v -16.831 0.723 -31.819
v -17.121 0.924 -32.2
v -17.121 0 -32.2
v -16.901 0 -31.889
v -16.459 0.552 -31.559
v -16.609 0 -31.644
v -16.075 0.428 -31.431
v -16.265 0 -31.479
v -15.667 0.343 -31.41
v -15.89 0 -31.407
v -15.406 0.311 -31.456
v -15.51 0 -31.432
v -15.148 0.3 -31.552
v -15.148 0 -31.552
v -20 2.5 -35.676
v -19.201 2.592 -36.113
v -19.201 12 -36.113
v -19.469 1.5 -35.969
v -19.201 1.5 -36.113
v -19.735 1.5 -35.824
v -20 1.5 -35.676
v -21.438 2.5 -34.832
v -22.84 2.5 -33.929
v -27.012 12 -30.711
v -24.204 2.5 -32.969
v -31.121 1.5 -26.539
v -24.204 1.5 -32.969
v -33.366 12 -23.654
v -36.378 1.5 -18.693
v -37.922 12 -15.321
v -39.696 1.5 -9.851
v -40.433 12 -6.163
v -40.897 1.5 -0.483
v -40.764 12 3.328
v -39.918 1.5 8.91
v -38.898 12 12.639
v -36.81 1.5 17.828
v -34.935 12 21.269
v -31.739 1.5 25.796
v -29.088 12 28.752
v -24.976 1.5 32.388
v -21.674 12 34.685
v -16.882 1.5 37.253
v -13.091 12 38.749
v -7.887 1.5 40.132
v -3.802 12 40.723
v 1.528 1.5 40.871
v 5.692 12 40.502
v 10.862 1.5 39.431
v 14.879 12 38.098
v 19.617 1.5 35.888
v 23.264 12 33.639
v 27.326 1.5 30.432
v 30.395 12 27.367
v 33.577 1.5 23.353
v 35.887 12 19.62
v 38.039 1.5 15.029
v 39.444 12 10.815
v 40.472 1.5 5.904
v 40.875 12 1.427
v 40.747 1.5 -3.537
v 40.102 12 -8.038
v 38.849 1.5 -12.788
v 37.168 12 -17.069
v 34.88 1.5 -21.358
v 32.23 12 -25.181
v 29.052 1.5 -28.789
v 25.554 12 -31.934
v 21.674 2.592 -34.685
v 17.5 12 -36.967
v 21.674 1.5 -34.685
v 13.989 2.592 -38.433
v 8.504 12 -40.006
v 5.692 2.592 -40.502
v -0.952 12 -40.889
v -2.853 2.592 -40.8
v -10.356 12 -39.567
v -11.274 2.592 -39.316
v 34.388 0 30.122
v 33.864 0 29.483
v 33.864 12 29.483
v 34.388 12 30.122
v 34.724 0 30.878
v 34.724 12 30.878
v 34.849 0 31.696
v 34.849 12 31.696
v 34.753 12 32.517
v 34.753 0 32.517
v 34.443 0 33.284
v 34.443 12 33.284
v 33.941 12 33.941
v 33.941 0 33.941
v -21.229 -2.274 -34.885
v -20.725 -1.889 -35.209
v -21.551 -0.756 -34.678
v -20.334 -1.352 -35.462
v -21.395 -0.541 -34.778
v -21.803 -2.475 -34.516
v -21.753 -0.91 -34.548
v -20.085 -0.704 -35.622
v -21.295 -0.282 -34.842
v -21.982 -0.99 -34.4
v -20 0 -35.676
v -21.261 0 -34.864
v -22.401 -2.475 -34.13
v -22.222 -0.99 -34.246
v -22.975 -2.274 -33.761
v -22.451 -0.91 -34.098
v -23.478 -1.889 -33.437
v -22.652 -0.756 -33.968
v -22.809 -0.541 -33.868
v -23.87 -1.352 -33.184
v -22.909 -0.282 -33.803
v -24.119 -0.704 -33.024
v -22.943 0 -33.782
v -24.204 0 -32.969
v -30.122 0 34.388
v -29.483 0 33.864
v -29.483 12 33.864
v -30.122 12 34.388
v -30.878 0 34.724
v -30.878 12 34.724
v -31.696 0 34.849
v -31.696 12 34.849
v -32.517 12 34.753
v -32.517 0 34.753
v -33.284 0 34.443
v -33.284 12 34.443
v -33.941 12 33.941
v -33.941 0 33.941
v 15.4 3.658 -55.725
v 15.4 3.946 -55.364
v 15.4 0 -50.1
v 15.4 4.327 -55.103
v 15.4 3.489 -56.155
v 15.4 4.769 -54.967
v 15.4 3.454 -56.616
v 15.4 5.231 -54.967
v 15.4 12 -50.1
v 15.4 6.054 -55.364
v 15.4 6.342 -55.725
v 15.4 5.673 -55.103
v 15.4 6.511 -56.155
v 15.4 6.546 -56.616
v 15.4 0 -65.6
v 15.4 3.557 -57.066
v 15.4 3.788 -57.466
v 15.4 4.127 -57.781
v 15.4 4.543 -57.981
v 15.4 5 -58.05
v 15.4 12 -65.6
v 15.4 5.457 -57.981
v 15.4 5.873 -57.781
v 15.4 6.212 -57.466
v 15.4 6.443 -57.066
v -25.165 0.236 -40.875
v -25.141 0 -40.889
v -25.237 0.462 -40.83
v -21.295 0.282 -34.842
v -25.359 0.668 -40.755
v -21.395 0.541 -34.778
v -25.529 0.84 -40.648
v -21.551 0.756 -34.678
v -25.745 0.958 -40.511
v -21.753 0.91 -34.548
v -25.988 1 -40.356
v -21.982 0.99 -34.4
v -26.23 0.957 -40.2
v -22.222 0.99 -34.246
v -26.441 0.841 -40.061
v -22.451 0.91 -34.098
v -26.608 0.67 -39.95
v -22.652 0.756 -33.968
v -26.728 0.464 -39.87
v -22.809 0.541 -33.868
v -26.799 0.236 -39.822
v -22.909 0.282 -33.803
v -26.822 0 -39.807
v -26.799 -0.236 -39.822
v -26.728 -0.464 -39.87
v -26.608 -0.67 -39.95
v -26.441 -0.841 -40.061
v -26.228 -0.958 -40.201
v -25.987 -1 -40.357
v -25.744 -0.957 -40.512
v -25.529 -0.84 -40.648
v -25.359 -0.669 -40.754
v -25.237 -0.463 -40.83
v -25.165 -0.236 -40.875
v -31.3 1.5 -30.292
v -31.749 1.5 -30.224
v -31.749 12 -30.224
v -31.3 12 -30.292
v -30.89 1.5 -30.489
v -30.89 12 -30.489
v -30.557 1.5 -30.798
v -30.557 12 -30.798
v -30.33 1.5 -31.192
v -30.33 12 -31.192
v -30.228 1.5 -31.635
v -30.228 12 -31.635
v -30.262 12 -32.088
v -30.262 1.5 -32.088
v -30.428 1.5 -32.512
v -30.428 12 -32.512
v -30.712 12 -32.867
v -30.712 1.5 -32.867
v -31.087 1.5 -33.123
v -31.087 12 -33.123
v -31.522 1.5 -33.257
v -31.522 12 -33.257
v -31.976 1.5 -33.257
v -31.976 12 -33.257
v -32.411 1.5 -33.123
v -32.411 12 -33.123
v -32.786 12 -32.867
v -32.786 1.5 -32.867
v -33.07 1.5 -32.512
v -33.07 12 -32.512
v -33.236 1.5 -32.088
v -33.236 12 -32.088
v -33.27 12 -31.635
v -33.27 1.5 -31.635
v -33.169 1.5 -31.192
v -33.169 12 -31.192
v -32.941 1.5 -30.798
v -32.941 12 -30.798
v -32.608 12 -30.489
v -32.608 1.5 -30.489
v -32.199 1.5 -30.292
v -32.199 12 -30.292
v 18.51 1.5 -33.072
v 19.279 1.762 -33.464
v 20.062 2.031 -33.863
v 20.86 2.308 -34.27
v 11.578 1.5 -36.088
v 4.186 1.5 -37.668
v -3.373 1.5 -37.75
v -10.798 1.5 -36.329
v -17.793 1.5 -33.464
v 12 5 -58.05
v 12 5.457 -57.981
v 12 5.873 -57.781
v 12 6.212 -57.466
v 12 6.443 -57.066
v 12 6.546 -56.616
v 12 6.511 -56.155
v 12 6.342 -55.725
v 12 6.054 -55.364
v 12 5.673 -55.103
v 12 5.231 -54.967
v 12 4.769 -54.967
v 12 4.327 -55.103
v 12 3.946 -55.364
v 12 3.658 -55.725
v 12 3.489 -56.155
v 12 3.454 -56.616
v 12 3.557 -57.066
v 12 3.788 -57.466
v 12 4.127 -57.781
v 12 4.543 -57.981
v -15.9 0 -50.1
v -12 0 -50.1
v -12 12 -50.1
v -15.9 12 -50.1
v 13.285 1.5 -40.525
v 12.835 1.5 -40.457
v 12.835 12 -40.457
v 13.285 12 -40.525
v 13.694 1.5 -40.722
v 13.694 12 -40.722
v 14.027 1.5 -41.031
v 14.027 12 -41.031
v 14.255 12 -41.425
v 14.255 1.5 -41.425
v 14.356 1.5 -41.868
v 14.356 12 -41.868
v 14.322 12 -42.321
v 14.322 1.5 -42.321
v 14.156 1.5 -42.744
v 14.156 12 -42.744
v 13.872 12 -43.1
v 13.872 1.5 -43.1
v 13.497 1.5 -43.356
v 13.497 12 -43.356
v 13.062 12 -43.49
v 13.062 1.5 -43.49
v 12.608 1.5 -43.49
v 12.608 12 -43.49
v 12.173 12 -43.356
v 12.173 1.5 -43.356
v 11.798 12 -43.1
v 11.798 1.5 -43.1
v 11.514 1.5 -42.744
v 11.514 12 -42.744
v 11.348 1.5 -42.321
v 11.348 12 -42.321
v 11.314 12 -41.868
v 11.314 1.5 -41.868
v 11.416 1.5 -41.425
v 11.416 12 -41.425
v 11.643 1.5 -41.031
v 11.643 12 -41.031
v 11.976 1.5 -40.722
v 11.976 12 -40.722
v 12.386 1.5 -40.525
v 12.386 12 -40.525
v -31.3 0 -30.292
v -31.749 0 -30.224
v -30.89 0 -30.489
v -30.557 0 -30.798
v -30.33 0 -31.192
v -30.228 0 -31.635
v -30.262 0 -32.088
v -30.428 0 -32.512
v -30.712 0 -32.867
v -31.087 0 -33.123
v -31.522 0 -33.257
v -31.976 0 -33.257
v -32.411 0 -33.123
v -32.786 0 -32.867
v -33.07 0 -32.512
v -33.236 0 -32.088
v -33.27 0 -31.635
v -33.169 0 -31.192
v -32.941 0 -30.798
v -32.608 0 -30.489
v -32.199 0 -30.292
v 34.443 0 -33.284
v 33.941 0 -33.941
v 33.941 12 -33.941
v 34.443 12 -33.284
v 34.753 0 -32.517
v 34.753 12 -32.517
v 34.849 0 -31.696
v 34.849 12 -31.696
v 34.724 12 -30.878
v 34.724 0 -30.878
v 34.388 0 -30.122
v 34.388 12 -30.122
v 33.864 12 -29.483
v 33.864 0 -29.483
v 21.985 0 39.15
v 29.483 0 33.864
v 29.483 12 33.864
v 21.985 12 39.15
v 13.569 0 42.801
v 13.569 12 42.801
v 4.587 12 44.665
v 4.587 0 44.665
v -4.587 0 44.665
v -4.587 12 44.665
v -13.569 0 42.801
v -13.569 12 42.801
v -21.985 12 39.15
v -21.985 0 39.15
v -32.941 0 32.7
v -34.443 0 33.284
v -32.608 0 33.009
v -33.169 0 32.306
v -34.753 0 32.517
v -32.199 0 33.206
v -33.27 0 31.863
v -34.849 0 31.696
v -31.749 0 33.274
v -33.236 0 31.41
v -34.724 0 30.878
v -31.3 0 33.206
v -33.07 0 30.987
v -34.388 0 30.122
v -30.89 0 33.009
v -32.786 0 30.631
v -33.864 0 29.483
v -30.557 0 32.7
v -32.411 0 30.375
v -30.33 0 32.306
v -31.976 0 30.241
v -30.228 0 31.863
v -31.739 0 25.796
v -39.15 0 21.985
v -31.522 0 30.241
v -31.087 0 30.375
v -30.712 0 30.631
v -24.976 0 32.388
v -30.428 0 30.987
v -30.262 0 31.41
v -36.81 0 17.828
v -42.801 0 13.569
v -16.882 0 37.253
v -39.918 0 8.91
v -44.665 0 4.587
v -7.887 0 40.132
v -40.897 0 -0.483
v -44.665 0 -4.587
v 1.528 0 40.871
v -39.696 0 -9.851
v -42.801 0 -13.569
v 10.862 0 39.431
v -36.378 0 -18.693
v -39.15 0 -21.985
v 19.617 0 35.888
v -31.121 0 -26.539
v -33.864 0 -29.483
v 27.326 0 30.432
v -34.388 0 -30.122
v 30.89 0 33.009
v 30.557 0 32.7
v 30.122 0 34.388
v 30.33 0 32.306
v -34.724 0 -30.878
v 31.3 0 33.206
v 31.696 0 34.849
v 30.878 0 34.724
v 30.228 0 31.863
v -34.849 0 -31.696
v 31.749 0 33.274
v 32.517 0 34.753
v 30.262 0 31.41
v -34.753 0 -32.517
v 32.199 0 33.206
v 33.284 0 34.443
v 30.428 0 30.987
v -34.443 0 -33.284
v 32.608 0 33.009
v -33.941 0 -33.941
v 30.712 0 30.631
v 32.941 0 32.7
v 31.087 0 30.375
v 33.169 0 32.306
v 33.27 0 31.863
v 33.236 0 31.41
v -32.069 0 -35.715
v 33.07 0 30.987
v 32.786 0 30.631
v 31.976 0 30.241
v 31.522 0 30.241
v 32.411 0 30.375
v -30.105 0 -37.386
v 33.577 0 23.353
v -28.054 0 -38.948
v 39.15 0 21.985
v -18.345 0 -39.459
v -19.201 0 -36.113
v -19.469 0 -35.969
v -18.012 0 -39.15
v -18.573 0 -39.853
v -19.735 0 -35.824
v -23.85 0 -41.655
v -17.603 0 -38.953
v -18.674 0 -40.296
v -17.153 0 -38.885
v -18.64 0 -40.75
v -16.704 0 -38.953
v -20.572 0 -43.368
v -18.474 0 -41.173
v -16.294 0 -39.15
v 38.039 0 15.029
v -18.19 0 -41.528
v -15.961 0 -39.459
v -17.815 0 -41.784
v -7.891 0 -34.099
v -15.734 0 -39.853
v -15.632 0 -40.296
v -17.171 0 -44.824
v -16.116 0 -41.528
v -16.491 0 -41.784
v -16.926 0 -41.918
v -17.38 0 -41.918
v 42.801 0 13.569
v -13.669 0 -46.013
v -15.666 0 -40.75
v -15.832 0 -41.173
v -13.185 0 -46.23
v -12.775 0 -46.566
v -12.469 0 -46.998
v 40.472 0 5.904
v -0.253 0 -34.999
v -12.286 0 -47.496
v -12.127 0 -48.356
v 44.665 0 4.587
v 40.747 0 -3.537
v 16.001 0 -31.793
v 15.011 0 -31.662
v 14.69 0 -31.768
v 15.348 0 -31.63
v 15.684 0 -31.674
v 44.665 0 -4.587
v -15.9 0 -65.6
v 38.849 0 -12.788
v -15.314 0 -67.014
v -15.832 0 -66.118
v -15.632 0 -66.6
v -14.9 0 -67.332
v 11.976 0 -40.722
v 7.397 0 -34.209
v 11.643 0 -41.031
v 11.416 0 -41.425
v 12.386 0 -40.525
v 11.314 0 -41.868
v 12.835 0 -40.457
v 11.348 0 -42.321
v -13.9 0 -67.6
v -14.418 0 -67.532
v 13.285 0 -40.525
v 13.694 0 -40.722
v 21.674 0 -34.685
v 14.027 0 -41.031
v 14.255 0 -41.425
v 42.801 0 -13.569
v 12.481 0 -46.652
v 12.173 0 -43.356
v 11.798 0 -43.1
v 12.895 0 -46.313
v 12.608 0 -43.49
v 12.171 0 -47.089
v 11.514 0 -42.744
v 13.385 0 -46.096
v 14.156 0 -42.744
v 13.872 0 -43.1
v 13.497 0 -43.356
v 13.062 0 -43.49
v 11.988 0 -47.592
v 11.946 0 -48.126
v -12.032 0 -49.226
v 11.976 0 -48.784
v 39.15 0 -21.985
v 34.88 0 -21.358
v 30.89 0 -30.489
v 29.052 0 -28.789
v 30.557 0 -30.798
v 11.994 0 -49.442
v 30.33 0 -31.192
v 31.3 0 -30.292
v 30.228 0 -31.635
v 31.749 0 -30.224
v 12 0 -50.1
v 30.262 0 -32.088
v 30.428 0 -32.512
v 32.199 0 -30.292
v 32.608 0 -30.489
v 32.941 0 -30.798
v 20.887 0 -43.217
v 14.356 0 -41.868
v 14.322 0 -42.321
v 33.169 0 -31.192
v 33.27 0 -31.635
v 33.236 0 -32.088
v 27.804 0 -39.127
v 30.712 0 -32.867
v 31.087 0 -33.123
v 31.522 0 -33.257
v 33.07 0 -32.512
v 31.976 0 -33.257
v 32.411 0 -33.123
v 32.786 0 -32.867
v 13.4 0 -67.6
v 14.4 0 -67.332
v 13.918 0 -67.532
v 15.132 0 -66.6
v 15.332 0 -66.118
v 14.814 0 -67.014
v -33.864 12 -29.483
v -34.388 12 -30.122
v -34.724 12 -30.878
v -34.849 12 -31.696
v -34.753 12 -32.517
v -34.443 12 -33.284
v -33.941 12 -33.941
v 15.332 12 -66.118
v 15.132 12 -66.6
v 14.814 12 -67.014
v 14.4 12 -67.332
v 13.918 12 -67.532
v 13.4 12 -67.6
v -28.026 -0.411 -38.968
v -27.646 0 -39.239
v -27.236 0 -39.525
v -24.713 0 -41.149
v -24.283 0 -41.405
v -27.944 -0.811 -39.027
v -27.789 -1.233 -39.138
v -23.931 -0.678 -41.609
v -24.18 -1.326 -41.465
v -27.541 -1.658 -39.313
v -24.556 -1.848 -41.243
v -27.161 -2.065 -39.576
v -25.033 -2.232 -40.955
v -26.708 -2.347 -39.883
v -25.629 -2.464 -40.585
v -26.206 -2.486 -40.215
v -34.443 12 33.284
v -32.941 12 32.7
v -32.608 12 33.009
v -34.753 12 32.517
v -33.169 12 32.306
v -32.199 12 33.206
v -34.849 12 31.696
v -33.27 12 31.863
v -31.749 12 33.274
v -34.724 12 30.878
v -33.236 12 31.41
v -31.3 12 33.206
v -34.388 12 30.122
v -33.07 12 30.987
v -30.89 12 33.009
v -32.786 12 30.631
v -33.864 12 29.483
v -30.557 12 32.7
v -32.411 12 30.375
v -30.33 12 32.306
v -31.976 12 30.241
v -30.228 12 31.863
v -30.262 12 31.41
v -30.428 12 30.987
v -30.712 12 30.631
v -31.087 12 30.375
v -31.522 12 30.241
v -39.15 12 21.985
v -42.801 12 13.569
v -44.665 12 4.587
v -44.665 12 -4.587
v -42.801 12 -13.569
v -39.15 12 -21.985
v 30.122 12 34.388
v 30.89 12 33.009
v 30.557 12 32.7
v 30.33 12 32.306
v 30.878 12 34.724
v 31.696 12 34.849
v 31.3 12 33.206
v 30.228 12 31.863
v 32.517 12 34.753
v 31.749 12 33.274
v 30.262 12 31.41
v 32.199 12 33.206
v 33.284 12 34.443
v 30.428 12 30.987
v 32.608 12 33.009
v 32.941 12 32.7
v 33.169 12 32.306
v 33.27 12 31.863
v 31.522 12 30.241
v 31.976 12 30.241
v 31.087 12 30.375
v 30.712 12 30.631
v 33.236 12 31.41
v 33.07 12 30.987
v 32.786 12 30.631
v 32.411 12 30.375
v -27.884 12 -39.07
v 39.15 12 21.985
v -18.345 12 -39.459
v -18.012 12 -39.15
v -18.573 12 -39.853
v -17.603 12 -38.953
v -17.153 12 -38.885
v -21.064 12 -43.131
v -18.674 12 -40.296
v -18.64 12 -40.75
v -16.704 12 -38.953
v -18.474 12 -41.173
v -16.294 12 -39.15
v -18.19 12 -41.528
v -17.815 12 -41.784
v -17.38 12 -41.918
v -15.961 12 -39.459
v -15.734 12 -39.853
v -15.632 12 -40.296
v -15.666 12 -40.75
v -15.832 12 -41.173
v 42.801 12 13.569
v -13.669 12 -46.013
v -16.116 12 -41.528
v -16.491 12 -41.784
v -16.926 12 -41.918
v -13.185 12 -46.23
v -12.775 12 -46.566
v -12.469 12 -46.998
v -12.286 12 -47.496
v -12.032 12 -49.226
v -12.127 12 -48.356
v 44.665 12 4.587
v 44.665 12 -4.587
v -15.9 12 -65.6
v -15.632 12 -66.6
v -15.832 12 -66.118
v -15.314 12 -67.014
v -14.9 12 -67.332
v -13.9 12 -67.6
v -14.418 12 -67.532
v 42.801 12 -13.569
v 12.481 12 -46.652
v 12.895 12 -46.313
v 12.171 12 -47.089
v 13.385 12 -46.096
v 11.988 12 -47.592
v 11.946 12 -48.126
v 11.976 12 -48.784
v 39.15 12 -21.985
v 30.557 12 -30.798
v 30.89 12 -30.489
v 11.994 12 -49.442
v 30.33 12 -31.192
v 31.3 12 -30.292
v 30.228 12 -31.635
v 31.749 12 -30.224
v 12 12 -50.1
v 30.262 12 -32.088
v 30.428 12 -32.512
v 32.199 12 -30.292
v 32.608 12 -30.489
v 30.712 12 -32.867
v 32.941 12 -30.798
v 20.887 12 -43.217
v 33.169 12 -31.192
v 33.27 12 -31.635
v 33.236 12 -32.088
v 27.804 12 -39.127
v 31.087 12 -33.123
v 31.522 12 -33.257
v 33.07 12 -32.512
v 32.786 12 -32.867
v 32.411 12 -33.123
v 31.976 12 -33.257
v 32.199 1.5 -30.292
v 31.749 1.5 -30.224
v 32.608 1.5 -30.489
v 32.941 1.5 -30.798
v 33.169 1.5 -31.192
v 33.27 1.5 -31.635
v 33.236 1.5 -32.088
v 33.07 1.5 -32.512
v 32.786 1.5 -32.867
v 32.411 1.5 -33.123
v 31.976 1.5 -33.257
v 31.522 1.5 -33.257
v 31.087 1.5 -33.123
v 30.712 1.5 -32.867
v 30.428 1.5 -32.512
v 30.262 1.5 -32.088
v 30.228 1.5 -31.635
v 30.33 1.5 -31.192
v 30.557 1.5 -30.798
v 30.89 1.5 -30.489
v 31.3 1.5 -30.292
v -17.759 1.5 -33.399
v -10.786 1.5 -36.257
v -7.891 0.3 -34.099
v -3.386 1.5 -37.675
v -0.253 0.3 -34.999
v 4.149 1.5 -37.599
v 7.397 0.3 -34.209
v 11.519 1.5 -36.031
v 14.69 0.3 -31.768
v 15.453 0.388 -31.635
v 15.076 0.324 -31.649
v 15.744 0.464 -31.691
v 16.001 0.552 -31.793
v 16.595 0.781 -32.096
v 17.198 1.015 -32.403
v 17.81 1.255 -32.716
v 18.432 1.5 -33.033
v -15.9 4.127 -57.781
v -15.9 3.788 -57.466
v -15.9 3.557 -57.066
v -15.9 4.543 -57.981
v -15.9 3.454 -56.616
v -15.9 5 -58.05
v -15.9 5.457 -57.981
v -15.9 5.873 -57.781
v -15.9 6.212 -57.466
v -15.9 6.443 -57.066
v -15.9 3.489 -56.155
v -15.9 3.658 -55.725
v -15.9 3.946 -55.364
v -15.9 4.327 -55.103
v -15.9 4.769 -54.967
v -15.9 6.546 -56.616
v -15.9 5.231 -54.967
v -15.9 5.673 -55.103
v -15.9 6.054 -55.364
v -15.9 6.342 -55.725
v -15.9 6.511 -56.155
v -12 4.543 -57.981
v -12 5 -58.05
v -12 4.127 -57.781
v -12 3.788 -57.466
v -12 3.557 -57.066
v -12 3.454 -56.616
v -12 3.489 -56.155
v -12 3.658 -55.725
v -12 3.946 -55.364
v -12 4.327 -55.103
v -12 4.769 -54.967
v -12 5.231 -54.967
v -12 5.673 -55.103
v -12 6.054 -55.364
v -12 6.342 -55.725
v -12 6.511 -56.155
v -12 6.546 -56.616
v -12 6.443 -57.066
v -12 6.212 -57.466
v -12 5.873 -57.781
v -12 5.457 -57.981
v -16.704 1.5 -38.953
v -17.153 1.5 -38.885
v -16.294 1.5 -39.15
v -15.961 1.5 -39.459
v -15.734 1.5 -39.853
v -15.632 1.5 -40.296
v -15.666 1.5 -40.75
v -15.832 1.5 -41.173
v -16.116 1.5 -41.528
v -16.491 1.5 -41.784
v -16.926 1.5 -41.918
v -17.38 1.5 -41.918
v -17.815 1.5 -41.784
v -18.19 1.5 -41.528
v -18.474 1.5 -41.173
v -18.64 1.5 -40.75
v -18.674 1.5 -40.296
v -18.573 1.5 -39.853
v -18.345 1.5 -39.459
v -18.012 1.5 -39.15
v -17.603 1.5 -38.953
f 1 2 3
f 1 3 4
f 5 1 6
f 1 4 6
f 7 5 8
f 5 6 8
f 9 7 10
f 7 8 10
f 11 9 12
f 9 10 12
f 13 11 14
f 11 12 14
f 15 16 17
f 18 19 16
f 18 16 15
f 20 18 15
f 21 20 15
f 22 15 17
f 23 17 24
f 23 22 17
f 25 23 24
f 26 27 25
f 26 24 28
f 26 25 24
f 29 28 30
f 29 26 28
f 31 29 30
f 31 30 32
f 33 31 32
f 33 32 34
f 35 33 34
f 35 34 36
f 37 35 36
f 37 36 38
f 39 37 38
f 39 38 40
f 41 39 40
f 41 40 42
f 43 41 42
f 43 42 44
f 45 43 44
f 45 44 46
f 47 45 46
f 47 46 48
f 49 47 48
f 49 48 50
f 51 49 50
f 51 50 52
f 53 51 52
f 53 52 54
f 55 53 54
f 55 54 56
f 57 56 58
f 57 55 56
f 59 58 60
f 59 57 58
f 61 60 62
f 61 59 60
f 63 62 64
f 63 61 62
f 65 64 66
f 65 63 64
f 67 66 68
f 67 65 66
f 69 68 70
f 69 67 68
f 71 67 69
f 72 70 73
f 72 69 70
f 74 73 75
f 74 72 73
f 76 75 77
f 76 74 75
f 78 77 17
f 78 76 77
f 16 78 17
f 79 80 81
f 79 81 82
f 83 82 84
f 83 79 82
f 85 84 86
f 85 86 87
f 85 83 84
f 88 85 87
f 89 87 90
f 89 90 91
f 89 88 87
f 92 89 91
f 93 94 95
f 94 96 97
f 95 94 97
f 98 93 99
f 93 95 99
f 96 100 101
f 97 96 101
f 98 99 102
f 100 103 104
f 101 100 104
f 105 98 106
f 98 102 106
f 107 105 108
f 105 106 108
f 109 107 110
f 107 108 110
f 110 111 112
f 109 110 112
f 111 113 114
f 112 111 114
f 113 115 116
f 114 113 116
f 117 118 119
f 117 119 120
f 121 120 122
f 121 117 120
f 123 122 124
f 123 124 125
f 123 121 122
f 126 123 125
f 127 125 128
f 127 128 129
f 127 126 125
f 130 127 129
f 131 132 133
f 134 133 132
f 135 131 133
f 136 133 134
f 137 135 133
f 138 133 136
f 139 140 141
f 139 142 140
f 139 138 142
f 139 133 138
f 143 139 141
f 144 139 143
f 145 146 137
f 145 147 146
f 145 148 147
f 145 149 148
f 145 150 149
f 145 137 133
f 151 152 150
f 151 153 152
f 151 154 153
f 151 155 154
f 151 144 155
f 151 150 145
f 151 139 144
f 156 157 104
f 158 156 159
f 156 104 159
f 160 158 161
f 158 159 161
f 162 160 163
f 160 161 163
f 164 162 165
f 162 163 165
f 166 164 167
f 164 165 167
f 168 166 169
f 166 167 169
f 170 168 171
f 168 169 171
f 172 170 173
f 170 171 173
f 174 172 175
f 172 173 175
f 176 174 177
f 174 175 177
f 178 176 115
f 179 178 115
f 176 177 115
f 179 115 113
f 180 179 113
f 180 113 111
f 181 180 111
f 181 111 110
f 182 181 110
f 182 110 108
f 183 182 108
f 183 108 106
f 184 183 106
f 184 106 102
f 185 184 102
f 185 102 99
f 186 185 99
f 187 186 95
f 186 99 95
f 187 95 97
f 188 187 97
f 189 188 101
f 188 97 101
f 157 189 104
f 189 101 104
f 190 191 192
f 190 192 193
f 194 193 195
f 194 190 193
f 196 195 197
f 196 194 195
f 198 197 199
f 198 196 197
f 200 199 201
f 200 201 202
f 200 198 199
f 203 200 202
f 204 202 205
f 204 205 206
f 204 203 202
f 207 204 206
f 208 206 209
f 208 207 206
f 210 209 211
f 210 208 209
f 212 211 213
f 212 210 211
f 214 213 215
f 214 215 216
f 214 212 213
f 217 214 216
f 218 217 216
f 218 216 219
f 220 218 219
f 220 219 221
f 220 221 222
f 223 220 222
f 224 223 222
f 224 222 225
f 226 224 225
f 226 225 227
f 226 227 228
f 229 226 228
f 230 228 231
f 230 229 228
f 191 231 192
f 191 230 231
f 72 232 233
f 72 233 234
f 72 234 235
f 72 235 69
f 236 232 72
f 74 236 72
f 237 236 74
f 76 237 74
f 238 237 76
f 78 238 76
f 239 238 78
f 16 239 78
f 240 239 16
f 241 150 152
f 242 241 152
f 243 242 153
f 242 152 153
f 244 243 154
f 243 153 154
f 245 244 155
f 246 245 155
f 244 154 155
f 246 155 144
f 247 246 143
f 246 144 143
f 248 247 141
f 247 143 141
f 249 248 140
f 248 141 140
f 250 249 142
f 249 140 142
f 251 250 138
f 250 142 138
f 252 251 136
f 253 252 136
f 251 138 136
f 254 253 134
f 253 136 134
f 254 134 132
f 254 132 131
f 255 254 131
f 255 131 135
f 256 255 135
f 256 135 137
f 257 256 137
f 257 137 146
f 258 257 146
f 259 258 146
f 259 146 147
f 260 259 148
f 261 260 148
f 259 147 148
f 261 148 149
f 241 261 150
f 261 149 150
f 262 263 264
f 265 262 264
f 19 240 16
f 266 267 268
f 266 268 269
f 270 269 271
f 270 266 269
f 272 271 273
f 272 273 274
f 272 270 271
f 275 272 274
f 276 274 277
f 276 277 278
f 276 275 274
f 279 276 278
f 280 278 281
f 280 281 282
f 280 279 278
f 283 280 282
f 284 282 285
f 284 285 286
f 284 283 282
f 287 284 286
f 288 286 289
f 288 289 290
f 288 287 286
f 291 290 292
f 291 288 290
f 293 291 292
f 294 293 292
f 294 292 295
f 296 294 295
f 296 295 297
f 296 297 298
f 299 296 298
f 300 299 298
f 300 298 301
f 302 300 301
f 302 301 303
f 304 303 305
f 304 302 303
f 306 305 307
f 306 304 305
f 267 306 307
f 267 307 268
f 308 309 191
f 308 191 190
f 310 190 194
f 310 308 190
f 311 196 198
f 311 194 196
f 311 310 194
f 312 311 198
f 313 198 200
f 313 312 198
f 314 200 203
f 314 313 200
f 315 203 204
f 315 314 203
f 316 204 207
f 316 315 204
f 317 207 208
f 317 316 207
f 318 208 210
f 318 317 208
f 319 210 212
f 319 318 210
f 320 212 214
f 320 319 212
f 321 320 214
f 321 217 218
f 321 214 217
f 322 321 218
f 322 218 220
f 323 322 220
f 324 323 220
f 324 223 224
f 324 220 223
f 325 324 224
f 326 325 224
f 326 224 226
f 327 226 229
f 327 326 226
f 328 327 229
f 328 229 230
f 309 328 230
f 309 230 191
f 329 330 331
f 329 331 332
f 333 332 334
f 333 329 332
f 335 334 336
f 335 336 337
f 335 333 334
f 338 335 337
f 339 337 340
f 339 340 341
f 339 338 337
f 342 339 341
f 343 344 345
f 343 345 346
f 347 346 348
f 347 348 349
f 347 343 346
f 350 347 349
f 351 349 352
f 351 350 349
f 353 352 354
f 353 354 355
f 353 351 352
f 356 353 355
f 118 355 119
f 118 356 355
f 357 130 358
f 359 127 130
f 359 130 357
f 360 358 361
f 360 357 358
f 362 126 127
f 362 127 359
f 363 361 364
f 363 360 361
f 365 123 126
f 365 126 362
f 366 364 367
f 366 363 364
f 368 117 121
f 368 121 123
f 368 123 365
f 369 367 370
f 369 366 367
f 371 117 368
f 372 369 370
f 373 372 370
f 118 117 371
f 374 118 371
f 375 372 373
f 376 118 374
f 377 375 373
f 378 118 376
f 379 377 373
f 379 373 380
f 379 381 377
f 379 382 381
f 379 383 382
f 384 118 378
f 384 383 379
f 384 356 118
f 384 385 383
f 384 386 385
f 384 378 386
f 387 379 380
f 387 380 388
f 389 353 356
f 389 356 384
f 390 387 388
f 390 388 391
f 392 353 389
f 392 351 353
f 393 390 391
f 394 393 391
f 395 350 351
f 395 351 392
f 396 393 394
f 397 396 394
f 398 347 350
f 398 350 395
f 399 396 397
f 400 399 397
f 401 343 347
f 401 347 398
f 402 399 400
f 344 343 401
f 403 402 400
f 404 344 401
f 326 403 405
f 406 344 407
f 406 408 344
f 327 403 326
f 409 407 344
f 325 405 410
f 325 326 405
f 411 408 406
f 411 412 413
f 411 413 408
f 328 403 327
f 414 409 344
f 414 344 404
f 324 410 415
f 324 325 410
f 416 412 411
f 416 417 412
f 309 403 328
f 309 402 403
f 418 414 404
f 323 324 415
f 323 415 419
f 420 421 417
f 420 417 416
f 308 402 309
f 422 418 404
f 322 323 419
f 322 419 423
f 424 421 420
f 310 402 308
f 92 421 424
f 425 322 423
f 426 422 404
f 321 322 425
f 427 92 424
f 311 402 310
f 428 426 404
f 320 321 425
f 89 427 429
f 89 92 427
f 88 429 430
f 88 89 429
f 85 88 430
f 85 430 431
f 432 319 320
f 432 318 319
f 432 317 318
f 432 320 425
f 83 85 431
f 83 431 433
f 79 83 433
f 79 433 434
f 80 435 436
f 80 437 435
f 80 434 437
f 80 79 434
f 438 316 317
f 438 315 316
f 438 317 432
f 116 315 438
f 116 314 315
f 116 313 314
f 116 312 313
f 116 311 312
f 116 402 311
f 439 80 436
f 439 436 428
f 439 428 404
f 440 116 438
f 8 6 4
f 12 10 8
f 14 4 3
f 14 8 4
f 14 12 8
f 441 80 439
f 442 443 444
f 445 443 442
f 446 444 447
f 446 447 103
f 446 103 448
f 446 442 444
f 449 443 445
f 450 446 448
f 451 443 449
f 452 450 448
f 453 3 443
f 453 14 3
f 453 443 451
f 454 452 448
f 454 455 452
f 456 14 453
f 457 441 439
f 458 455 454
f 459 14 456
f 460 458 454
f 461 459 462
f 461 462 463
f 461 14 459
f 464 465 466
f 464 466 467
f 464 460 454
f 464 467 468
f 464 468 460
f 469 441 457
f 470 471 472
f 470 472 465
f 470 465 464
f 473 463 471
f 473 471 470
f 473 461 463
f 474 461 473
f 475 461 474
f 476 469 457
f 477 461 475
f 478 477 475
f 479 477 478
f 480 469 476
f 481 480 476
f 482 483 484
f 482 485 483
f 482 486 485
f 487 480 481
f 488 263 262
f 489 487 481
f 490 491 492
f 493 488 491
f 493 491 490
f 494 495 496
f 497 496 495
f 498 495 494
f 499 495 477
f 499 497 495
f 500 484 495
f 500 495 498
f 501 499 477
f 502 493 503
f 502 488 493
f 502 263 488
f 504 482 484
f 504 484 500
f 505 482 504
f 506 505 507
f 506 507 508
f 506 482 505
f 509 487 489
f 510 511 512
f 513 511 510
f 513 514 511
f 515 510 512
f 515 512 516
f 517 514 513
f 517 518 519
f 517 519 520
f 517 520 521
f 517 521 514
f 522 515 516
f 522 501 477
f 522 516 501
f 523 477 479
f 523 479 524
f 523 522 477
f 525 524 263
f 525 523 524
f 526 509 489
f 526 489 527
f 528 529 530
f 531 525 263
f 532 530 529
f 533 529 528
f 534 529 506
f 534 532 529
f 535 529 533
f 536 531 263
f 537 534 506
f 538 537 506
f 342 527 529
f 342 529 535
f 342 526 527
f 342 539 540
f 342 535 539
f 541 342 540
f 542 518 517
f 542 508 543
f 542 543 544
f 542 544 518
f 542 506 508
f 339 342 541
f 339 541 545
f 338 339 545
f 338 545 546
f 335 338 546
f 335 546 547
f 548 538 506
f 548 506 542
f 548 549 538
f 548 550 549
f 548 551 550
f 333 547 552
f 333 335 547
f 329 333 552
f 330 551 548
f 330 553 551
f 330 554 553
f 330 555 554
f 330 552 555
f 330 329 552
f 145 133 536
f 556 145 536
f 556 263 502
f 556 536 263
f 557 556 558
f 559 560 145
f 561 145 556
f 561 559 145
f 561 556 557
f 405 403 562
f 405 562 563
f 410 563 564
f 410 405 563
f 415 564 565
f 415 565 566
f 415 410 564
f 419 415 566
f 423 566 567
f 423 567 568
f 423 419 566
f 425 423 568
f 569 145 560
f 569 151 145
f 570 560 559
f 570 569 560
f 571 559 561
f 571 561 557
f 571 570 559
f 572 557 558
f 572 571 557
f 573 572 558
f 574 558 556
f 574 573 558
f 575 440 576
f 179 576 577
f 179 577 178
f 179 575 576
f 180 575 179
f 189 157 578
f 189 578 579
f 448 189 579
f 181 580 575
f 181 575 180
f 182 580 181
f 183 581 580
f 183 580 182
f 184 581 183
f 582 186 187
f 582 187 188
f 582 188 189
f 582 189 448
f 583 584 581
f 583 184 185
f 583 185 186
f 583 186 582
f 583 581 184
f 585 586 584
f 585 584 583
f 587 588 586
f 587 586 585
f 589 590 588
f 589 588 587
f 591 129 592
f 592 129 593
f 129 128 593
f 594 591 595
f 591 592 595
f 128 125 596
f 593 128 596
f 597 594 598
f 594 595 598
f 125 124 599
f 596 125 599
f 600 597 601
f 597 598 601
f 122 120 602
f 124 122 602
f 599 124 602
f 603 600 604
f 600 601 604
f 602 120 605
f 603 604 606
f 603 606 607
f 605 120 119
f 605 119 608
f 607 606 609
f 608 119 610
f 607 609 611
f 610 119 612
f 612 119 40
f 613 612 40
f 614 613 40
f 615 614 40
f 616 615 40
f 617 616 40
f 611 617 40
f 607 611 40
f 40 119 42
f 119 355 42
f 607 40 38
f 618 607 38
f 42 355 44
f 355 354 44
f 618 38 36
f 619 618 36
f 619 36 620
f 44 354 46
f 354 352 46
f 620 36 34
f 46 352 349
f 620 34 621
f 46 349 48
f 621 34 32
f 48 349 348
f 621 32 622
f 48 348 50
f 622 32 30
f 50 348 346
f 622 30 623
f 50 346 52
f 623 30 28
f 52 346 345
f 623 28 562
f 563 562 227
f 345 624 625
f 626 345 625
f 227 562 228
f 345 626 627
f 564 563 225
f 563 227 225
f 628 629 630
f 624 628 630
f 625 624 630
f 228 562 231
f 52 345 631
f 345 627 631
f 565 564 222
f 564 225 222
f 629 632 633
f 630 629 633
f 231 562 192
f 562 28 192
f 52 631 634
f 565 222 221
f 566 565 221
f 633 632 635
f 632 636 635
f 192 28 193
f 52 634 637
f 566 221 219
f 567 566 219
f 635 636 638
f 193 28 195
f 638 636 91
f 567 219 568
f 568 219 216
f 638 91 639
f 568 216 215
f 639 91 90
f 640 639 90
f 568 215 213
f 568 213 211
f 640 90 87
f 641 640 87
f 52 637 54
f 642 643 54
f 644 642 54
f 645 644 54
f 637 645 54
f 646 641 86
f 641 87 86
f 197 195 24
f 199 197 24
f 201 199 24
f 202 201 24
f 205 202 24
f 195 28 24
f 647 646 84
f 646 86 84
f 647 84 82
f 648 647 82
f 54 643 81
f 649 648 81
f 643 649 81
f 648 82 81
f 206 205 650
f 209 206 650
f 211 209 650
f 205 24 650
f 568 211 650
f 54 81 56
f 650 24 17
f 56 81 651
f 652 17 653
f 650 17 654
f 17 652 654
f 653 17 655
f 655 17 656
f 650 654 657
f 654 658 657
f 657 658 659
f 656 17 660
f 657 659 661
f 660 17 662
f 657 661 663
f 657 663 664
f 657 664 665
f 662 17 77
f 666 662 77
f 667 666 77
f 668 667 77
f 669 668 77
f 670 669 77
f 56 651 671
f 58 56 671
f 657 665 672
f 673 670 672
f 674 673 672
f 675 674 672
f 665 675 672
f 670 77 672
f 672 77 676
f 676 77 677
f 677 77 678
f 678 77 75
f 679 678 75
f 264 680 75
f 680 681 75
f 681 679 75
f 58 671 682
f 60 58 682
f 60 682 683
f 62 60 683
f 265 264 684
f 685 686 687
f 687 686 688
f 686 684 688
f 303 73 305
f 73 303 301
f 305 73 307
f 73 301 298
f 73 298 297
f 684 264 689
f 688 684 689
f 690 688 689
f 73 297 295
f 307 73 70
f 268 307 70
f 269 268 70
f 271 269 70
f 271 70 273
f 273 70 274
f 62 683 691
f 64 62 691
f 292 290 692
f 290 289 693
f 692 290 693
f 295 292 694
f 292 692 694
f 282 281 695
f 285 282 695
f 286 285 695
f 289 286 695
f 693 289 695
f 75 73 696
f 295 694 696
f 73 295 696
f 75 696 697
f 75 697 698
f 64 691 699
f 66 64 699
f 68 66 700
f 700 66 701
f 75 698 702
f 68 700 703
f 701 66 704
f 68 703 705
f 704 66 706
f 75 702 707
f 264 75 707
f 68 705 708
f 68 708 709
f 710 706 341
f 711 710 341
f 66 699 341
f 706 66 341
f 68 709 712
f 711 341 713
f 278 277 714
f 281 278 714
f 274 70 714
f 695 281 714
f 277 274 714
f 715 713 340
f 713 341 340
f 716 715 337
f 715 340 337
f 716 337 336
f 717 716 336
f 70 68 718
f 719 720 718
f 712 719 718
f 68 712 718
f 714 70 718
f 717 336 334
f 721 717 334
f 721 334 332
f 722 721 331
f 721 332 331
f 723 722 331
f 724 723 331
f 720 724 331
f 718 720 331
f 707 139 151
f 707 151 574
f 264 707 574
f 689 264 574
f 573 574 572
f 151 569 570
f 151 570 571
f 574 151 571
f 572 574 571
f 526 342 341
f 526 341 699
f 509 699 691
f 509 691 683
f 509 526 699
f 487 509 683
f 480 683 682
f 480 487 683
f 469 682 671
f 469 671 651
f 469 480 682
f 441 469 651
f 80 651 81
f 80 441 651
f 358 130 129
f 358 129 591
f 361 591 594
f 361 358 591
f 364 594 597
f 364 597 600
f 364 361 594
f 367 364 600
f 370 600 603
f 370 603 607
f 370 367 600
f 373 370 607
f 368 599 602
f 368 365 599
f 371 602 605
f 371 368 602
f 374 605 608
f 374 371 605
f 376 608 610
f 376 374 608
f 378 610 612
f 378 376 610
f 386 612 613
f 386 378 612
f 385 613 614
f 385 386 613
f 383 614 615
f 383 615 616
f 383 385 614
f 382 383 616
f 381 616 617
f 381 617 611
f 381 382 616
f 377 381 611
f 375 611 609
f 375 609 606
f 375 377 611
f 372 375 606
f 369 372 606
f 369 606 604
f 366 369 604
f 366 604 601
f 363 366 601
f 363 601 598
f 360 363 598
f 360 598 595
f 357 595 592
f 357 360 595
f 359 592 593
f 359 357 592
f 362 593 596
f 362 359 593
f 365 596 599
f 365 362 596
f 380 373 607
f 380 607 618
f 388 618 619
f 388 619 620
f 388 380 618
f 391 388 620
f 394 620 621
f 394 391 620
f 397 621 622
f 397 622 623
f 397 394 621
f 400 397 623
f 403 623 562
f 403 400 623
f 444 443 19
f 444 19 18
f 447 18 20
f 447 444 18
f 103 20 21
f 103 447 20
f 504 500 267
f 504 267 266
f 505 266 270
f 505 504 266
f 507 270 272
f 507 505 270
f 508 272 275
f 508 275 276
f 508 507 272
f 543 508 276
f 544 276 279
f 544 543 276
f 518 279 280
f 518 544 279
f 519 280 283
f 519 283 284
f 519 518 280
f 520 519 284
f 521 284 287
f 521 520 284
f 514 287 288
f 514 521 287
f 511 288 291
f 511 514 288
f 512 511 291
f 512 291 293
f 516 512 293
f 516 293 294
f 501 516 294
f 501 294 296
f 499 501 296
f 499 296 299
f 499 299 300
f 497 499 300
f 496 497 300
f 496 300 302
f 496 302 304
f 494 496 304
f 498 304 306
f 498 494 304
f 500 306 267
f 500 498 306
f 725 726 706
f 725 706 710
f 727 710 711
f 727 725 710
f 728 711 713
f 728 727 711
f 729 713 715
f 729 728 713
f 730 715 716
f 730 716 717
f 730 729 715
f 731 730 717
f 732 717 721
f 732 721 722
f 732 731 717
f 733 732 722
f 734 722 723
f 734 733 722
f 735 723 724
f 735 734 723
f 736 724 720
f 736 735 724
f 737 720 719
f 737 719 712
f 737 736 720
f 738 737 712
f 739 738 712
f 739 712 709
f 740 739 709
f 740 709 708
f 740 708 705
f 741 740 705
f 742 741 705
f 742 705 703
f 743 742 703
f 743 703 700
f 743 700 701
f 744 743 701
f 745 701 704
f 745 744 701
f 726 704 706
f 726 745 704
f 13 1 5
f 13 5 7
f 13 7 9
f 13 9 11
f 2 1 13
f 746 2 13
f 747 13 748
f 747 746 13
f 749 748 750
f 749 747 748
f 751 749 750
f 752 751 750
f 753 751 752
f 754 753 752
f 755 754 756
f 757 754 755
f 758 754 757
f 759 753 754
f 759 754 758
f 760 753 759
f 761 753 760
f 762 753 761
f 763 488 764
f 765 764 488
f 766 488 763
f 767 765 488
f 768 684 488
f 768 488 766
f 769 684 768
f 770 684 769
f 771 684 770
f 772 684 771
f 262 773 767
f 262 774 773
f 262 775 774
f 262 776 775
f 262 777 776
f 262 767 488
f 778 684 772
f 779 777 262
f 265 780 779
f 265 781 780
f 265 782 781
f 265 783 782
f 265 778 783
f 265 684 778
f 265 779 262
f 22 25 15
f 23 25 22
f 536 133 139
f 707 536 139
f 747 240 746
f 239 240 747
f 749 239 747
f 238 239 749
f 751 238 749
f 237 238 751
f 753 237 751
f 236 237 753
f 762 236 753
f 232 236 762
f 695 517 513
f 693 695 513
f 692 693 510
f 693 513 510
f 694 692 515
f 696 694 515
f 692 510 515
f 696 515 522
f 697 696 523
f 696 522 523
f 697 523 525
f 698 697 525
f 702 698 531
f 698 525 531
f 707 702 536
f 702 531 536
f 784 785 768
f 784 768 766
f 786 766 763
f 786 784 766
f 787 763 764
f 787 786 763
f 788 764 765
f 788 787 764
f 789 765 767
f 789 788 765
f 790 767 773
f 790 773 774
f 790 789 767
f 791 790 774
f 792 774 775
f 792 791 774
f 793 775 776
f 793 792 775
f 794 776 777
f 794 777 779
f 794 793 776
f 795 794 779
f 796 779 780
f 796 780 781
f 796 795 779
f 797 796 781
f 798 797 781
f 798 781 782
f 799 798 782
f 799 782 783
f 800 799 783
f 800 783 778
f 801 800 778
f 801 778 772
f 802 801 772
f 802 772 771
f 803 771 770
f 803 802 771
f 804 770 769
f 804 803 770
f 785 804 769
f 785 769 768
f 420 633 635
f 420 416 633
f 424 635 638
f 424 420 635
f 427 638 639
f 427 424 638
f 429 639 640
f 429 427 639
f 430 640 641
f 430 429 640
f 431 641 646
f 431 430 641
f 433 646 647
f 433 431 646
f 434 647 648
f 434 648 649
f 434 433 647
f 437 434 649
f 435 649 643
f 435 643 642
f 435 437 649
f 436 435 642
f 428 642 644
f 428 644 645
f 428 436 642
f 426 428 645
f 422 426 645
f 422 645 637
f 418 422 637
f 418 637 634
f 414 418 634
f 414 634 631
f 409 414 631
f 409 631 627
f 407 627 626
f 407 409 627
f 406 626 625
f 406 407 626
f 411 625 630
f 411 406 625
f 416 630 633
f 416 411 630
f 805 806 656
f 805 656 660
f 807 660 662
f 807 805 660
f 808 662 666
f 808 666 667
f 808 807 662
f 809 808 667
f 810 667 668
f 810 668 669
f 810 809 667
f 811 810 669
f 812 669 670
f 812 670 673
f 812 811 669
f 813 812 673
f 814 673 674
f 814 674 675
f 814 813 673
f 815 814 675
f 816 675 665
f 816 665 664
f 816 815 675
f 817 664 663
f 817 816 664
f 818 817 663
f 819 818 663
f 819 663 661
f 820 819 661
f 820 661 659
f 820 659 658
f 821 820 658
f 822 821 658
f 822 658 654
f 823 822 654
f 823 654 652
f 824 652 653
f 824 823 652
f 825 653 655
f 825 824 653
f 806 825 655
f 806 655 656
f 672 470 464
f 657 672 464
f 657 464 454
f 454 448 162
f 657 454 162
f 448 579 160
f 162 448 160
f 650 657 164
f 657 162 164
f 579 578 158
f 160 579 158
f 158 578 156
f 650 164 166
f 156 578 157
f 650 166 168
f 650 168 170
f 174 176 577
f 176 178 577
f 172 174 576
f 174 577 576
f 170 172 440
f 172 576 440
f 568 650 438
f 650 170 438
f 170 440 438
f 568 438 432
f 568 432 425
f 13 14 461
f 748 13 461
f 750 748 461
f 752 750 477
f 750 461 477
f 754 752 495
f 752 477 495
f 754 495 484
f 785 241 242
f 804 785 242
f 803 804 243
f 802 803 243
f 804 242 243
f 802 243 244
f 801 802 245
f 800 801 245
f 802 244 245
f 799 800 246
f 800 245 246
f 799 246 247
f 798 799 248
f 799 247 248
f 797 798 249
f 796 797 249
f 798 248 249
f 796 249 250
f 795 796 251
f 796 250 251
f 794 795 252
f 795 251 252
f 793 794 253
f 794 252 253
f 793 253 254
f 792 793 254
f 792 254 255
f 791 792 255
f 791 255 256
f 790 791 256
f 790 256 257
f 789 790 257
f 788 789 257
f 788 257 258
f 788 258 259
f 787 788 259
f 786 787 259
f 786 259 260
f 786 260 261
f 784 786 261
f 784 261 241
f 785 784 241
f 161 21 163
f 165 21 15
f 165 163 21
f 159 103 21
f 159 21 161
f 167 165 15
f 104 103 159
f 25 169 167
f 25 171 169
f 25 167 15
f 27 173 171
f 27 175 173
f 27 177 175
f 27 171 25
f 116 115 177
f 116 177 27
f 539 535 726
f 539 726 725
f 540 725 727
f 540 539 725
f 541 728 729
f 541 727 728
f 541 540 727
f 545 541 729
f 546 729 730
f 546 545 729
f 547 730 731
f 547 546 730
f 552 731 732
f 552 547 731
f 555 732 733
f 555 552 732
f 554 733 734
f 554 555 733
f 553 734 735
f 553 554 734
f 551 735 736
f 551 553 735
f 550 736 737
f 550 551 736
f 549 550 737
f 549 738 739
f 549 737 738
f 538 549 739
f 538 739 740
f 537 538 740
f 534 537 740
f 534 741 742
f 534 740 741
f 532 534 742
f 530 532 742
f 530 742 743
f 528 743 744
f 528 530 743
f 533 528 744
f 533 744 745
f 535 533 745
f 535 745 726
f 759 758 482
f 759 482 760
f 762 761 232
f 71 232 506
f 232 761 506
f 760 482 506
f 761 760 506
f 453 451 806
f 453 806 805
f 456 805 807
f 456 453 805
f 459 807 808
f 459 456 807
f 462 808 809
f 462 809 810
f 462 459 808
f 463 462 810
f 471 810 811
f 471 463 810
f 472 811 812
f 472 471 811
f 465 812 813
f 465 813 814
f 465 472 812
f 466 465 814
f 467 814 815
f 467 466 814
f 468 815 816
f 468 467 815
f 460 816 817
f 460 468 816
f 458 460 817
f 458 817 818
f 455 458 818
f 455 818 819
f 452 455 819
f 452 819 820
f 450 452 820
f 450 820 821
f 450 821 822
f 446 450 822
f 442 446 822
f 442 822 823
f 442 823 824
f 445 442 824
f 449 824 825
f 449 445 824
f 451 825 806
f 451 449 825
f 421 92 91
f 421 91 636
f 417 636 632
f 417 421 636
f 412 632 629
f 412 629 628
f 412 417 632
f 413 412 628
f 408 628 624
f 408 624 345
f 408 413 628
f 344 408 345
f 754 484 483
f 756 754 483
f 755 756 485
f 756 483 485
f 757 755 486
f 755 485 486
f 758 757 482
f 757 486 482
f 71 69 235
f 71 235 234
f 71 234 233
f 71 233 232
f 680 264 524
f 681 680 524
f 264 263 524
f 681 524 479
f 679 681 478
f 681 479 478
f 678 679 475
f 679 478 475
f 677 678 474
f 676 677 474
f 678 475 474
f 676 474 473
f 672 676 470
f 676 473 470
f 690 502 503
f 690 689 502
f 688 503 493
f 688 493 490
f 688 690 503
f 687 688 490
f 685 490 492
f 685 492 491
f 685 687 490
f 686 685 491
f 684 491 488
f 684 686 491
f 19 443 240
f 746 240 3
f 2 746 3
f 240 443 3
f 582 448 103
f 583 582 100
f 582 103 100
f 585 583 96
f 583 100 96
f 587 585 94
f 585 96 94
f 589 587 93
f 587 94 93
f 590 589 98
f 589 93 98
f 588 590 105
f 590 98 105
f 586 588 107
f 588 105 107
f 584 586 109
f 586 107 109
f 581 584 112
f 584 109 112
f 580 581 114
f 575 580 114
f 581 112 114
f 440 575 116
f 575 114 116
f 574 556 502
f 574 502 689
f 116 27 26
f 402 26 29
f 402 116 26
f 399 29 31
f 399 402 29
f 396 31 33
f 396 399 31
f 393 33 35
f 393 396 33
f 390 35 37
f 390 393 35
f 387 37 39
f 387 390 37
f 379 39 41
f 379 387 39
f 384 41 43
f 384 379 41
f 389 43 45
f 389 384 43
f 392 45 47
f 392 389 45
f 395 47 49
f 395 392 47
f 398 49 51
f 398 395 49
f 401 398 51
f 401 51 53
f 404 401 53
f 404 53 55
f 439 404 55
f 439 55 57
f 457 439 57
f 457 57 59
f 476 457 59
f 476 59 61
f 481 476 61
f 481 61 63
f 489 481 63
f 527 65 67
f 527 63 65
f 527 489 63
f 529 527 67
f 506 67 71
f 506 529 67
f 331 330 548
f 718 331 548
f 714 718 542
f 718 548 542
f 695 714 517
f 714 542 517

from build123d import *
from build123d.topology import SkipClean

# Parameters (mm, degrees)
SKETCH_1_R               = 40.9
SKETCH_1_R_2             = 1.525
EXTRUDE_1_DEPTH          = 1.5
EXTRUDE_START            = -1.5
EXTRUDE_2_DEPTH          = 1.5
CUT_EXTRUDE_1_DEPTH      = 70.399279535
CUT_EXTRUDE_1_DEPTH_BACK = 70.399279535
SKETCH_3_R               = 1.525
SKETCH_4_R               = 40.9
SKETCH_4_R_2             = 1.525
EXTRUDE_3_DEPTH          = 10.5
CUT_EXTRUDE_START        = -12
CUT_EXTRUDE_2_DEPTH      = 12
EXTRUDE_4_DEPTH          = 2.5
EXTRUDE_5_REACH          = 106.449
EXTRUDE_5_END_RADIUS     = 48
SKETCH_8_R               = 1
CUT_EXTRUDE_3_DEPTH      = 105.448711512
CHAMFER_1_SIZE           = 1.2
CHAMFER_1_SIZE_2         = 2.827022839
CHAMFER_2_SIZE           = 1.091910703
CHAMFER_2_SIZE_2         = 3
SKETCH_9_W               = 24
SKETCH_9_H               = 12
EXTRUDE_6_DEPTH          = 17.5
SKETCH_10_R              = 1.55
CUT_EXTRUDE_4_DEPTH      = 90.170454762
SKETCH_11_W              = 17.5
SKETCH_11_H              = 12
SKETCH_11_R              = 1.55
EXTRUDE_7_DEPTH          = 3.9
EXTRUDE_START_2          = 3.4
SKETCH_12_W              = 17.5
SKETCH_12_H              = 12
SKETCH_12_R              = 1.55
EXTRUDE_8_DEPTH          = 3.4
FILLET_1_R               = 2


with BuildPart() as part:
    # 草图1 → 凸台-拉伸1 (new body)
    with BuildSketch(Plane(origin=(0, 0, 0), x_dir=(1, 0, 0), z_dir=(0, 1, 0))):
        with BuildLine():
            Line((12, 50.1), (-12, 50.1))
            ThreePointArc((-12, 50.1), (-12.071709603, 48.790080839), (-12.285981368, 47.495817309))
            ThreePointArc((-12.285981368, 47.495817309), (-12.775478285, 46.565992731), (-13.668785094, 46.012653847))
            ThreePointArc((-13.668785094, 46.012653847), (0.147817484, -47.999772395), (13.385132402, 46.095967617))
            ThreePointArc((13.385132402, 46.095967617), (12.311228539, 46.859989672), (11.945854344, 48.126283833))
            ThreePointArc((11.945854344, 48.126283833), (11.98646104, 49.112770637), (12, 50.1))
        make_face()
        with Locations(Location((0, 0, 0), (0, 0, 270))):
            Circle(SKETCH_1_R, mode=Mode.SUBTRACT)
        with Locations(Location((12.835117837, 41.981778787, 0), (0, 0, 270))):
            Circle(SKETCH_1_R_2, mode=Mode.SUBTRACT)
        with Locations(Location((-17.153096541, 40.410163067, 0), (0, 0, 270))):
            Circle(SKETCH_1_R_2, mode=Mode.SUBTRACT)
    extrude(amount=EXTRUDE_1_DEPTH)

    # 草图2 → 凸台-拉伸2 (add)
    with BuildSketch(Plane(origin=(0, 1.5, 0), x_dir=(1, 0, 0), z_dir=(0, 1, 0)).offset(EXTRUDE_START)):
        with BuildLine():
            Line((-19.201386918, 36.112556548), (-17.121235913, 32.200361501))
            ThreePointArc((-17.121235913, 32.200361501), (-16.264760822, 31.479428059), (-15.147630365, 31.55232629))
            ThreePointArc((-15.147630365, 31.55232629), (-0.252986109, 34.999085674), (14.689928016, 31.768003004))
            ThreePointArc((14.689928016, 31.768003004), (15.348239226, 31.629764257), (16.000770136, 31.793125857))
            Line((16.000770136, 31.793125857), (21.673697907, 34.685167133))
            ThreePointArc((21.673697907, 34.685167133), (1.427389415, 40.875084825), (-19.201386918, 36.112556548))
        make_face()
    extrude(amount=EXTRUDE_2_DEPTH)

    # 草图3 → 切除-拉伸1 (cut, two sides: drawn at the far end of the back side and taken through both)
    with BuildSketch(Plane(origin=(0, 1.5, 0), x_dir=(1, 0, 0), z_dir=(0, 1, 0)).offset(-CUT_EXTRUDE_1_DEPTH_BACK)):
        with Locations(Location((31.749094475, 31.749094475, 0), (0, 0, 270))):
            Circle(SKETCH_3_R)
        with Locations(Location((31.749094475, -31.749094475, 0), (0, 0, 270))):
            Circle(SKETCH_3_R)
        with Locations(Location((-31.749094475, -31.749094475, 0), (0, 0, 270))):
            Circle(SKETCH_3_R)
        with Locations(Location((-31.749094475, 31.749094475, 0), (0, 0, 270))):
            Circle(SKETCH_3_R)
    extrude(amount=CUT_EXTRUDE_1_DEPTH + CUT_EXTRUDE_1_DEPTH_BACK, mode=Mode.SUBTRACT)

    # 草图4 → 凸台-拉伸3 (add)
    with SkipClean():  # the faces are left unmerged after this step: merging them gives an invalid solid
        with BuildSketch(Plane(origin=(0, 1.5, 0), x_dir=(1, 0, 0), z_dir=(0, 1, 0))):
            with BuildLine():
                Line((12, 50.1), (-12, 50.1))
                ThreePointArc((-12, 50.1), (-12.071709603, 48.790080839), (-12.285981368, 47.495817309))
                ThreePointArc((-12.285981368, 47.495817309), (-12.775478285, 46.565992731), (-13.668785094, 46.012653847))
                ThreePointArc((-13.668785094, 46.012653847), (0.147817484, -47.999772395), (13.385132402, 46.095967617))
                ThreePointArc((13.385132402, 46.095967617), (12.311228539, 46.859989672), (11.945854344, 48.126283833))
                ThreePointArc((11.945854344, 48.126283833), (11.98646104, 49.112770637), (12, 50.1))
            make_face()
            with Locations(Location((0, 0, 0), (0, 0, 118))):
                Circle(SKETCH_4_R, mode=Mode.SUBTRACT)
            with Locations(Location((-17.153096541, 40.410163067, 0), (0, 0, 270))):
                Circle(SKETCH_4_R_2, mode=Mode.SUBTRACT)
            with Locations(Location((12.835117837, 41.981778787, 0), (0, 0, 270))):
                Circle(SKETCH_4_R_2, mode=Mode.SUBTRACT)
            with Locations(Location((31.749094475, 31.749094475, 0), (0, 0, 270))):
                Circle(SKETCH_4_R_2, mode=Mode.SUBTRACT)
            with Locations(Location((31.749094475, -31.749094475, 0), (0, 0, 270))):
                Circle(SKETCH_4_R_2, mode=Mode.SUBTRACT)
            with Locations(Location((-31.749094475, -31.749094475, 0), (0, 0, 270))):
                Circle(SKETCH_4_R_2, mode=Mode.SUBTRACT)
            with Locations(Location((-31.749094475, 31.749094475, 0), (0, 0, 270))):
                Circle(SKETCH_4_R_2, mode=Mode.SUBTRACT)
        extrude(amount=EXTRUDE_3_DEPTH)
    add(part.part.scale(1), mode=Mode.REPLACE)  # the faces are merged on a copy

    # 草图5 → 切除-拉伸2 (cut)
    with BuildSketch(Plane(origin=(0, 12, 0), x_dir=(1, 0, 0), z_dir=(0, 1, 0)).offset(CUT_EXTRUDE_START)):
        with BuildLine():
            ThreePointArc((-33.864147525, 29.482698526), (-34.848632515, 31.695578705), (-33.941125497, 33.941125497))
            ThreePointArc((-33.941125497, 33.941125497), (-48, 0), (-33.941125497, -33.941125497))
            ThreePointArc((-33.941125497, -33.941125497), (-34.848632515, -31.695578705), (-33.864147525, -29.482698526))
            ThreePointArc((-33.864147525, -29.482698526), (-44.9, 0), (-33.864147525, 29.482698526))
        make_face()
        with BuildLine():
            ThreePointArc((33.864147525, -29.482698526), (34.848632515, -31.695578705), (33.941125497, -33.941125497))
            ThreePointArc((33.941125497, -33.941125497), (48, 0), (33.941125497, 33.941125497))
            ThreePointArc((33.941125497, 33.941125497), (34.848632515, 31.695578705), (33.864147525, 29.482698526))
            ThreePointArc((33.864147525, 29.482698526), (44.9, 0), (33.864147525, -29.482698526))
        make_face()
        with BuildLine():
            ThreePointArc((-29.482698526, -33.864147525), (-31.695578705, -34.848632515), (-33.941125497, -33.941125497))
            ThreePointArc((-33.941125497, -33.941125497), (0, -48), (33.941125497, -33.941125497))
            ThreePointArc((33.941125497, -33.941125497), (31.695578705, -34.848632515), (29.482698526, -33.864147525))
            ThreePointArc((29.482698526, -33.864147525), (0, -44.9), (-29.482698526, -33.864147525))
        make_face()
    extrude(amount=CUT_EXTRUDE_2_DEPTH, mode=Mode.SUBTRACT)

    # 草图6 → 凸台-拉伸4 (add)
    with BuildSketch(Plane.XZ):
        with BuildLine():
            Line((-20, -35.676462829), (-24.203821377, -32.969456027))
            ThreePointArc((-24.203821377, -32.969456027), (-22.14331564, -34.387258868), (-20, -35.676462829))
        make_face()
    extrude(amount=-EXTRUDE_4_DEPTH)

    # 凸台-拉伸5: up to this cylinder (the profile starts inside it)
    extrude_5_end = Plane(origin=(0, -1.061033, 0), z_dir=(0, -1, 0)) * Cylinder(EXTRUDE_5_END_RADIUS, 309.898, mode=Mode.PRIVATE)
    # 草图7 → 凸台-拉伸5 (add, up to the surface)
    with BuildSketch(Plane(origin=(-22.101910689, 0, -34.322959428), x_dir=(0.8407642754995167, 0, -0.5414013604007409), z_dir=(0.5414013604007408, 0, 0.8407642754995166)), mode=Mode.PRIVATE) as extrude_5_sk1:
        with BuildLine():
            Line((-2.5, 0), (2.5, 0))
            ThreePointArc((2.5, 0), (0, -2.5), (-2.5, 0))
        make_face()
    extrude_5_tool1 = extrude(extrude_5_sk1.sketch, amount=-EXTRUDE_5_REACH, mode=Mode.PRIVATE) & extrude_5_end
    add(extrude_5_tool1.solids().sort_by_distance((-22.101911, -1.061033, -34.322959))[0])

    # 草图8 → 切除-拉伸3 (cut, through all)
    with BuildSketch(Plane(origin=(-22.101910689, 0, -34.322959428), x_dir=(0.8407642754995167, 0, -0.5414013604007409), z_dir=(0.5414013604007408, 0, 0.8407642754995166))):
        Circle(SKETCH_8_R)
    extrude(amount=-CUT_EXTRUDE_3_DEPTH, mode=Mode.SUBTRACT)

    # 倒角1
    # the kernel refuses this chamfer: 2.827022839, 1.2 mm, written as the material it takes off along each edge
    with BuildSketch(Plane(origin=(0, 1.5, 0), x_dir=(-0.6107443245214345, 0, -0.7918278664361699), z_dir=(-0.7918278664361699, 0, 0.6107443245214345))) as chamfer_1_piece_1:
        Polygon((35, CHAMFER_1_SIZE), (35 + CHAMFER_1_SIZE_2, 0), (35, 0), align=None)
    revolve(axis=Axis((0, 1.5, 0), (0, -1, 0)), revolution_arc=74.458388902, mode=Mode.SUBTRACT)

    # 倒角2
    # the kernel refuses this chamfer: 3, 1.091910703 mm, written as the material it adds along each edge
    with BuildSketch(Plane(origin=(0, 1.5, 0), x_dir=(0.6807767680816117, 0, -0.7324909501422905), z_dir=(0.7324909501422905, 0, 0.6807767680816117))) as chamfer_2_piece_1_section:
        Polygon((40.9, CHAMFER_2_SIZE), (40.9 - CHAMFER_2_SIZE_2, 0), (40.9, 0), align=None)
    chamfer_2_piece_1 = revolve(axis=Axis((0, 1.5, 0), (0, 1, 0)), revolution_arc=70.9043723, mode=Mode.PRIVATE)
    chamfer_2_piece_1 = split(chamfer_2_piece_1, bisect_by=Plane(origin=(7.492047447, 2.005552707, -27.455404982), z_dir=(-0.45418251766199275, 0, -0.8909086601050715)), keep=Keep.TOP, mode=Mode.PRIVATE)
    add(chamfer_2_piece_1)

    # 草图9 → 凸台-拉伸6 (add)
    with BuildSketch(Plane(origin=(0, 0, -50.1), x_dir=(-1, 0, 0), z_dir=(0, 0, -1))):
        with Locations((0, 6)):
            Rectangle(SKETCH_9_W, SKETCH_9_H)
    extrude(amount=EXTRUDE_6_DEPTH)

    # 草图10 → 切除-拉伸4 (cut, through all)
    with BuildSketch(Plane(origin=(12, 0, 0), x_dir=(0, 0, -1), z_dir=(1, 0, 0))):
        with Locations((56.5, 5)):
            Circle(SKETCH_10_R)
    extrude(amount=-CUT_EXTRUDE_4_DEPTH, mode=Mode.SUBTRACT)

    # 草图11 → 凸台-拉伸7 (add)
    with SkipClean():  # the faces are left unmerged after this step: merging them gives an invalid solid
        with BuildSketch(Plane.ZY.offset(12)):
            with Locations((-58.85, 6)):
                Rectangle(SKETCH_11_W, SKETCH_11_H)
            with Locations(Location((-56.5, 5, 0), (0, 0, 180))):
                Circle(SKETCH_11_R, mode=Mode.SUBTRACT)
        extrude(amount=EXTRUDE_7_DEPTH)

    # 草图12 → 凸台-拉伸8 (add)
    with SkipClean():  # the faces are left unmerged after this step: merging them gives an invalid solid
        with BuildSketch(Plane(origin=(12, 0, 0), x_dir=(0, 0, -1), z_dir=(1, 0, 0)).offset(EXTRUDE_START_2)):
            with Locations((58.85, 6)):
                Rectangle(SKETCH_12_W, SKETCH_12_H)
            with Locations((56.5, 5)):
                Circle(SKETCH_12_R, mode=Mode.SUBTRACT)
        extrude(amount=-EXTRUDE_8_DEPTH)

    # 圆角1
    fillet_1_edges = [part.edges().sort_by_distance(p)[0] for p in [
        (-15.9, 6, -67.6),
        (15.4, 6, -67.6),
    ]]
    fillet(fillet_1_edges, radius=FILLET_1_R)


solid = part.part
